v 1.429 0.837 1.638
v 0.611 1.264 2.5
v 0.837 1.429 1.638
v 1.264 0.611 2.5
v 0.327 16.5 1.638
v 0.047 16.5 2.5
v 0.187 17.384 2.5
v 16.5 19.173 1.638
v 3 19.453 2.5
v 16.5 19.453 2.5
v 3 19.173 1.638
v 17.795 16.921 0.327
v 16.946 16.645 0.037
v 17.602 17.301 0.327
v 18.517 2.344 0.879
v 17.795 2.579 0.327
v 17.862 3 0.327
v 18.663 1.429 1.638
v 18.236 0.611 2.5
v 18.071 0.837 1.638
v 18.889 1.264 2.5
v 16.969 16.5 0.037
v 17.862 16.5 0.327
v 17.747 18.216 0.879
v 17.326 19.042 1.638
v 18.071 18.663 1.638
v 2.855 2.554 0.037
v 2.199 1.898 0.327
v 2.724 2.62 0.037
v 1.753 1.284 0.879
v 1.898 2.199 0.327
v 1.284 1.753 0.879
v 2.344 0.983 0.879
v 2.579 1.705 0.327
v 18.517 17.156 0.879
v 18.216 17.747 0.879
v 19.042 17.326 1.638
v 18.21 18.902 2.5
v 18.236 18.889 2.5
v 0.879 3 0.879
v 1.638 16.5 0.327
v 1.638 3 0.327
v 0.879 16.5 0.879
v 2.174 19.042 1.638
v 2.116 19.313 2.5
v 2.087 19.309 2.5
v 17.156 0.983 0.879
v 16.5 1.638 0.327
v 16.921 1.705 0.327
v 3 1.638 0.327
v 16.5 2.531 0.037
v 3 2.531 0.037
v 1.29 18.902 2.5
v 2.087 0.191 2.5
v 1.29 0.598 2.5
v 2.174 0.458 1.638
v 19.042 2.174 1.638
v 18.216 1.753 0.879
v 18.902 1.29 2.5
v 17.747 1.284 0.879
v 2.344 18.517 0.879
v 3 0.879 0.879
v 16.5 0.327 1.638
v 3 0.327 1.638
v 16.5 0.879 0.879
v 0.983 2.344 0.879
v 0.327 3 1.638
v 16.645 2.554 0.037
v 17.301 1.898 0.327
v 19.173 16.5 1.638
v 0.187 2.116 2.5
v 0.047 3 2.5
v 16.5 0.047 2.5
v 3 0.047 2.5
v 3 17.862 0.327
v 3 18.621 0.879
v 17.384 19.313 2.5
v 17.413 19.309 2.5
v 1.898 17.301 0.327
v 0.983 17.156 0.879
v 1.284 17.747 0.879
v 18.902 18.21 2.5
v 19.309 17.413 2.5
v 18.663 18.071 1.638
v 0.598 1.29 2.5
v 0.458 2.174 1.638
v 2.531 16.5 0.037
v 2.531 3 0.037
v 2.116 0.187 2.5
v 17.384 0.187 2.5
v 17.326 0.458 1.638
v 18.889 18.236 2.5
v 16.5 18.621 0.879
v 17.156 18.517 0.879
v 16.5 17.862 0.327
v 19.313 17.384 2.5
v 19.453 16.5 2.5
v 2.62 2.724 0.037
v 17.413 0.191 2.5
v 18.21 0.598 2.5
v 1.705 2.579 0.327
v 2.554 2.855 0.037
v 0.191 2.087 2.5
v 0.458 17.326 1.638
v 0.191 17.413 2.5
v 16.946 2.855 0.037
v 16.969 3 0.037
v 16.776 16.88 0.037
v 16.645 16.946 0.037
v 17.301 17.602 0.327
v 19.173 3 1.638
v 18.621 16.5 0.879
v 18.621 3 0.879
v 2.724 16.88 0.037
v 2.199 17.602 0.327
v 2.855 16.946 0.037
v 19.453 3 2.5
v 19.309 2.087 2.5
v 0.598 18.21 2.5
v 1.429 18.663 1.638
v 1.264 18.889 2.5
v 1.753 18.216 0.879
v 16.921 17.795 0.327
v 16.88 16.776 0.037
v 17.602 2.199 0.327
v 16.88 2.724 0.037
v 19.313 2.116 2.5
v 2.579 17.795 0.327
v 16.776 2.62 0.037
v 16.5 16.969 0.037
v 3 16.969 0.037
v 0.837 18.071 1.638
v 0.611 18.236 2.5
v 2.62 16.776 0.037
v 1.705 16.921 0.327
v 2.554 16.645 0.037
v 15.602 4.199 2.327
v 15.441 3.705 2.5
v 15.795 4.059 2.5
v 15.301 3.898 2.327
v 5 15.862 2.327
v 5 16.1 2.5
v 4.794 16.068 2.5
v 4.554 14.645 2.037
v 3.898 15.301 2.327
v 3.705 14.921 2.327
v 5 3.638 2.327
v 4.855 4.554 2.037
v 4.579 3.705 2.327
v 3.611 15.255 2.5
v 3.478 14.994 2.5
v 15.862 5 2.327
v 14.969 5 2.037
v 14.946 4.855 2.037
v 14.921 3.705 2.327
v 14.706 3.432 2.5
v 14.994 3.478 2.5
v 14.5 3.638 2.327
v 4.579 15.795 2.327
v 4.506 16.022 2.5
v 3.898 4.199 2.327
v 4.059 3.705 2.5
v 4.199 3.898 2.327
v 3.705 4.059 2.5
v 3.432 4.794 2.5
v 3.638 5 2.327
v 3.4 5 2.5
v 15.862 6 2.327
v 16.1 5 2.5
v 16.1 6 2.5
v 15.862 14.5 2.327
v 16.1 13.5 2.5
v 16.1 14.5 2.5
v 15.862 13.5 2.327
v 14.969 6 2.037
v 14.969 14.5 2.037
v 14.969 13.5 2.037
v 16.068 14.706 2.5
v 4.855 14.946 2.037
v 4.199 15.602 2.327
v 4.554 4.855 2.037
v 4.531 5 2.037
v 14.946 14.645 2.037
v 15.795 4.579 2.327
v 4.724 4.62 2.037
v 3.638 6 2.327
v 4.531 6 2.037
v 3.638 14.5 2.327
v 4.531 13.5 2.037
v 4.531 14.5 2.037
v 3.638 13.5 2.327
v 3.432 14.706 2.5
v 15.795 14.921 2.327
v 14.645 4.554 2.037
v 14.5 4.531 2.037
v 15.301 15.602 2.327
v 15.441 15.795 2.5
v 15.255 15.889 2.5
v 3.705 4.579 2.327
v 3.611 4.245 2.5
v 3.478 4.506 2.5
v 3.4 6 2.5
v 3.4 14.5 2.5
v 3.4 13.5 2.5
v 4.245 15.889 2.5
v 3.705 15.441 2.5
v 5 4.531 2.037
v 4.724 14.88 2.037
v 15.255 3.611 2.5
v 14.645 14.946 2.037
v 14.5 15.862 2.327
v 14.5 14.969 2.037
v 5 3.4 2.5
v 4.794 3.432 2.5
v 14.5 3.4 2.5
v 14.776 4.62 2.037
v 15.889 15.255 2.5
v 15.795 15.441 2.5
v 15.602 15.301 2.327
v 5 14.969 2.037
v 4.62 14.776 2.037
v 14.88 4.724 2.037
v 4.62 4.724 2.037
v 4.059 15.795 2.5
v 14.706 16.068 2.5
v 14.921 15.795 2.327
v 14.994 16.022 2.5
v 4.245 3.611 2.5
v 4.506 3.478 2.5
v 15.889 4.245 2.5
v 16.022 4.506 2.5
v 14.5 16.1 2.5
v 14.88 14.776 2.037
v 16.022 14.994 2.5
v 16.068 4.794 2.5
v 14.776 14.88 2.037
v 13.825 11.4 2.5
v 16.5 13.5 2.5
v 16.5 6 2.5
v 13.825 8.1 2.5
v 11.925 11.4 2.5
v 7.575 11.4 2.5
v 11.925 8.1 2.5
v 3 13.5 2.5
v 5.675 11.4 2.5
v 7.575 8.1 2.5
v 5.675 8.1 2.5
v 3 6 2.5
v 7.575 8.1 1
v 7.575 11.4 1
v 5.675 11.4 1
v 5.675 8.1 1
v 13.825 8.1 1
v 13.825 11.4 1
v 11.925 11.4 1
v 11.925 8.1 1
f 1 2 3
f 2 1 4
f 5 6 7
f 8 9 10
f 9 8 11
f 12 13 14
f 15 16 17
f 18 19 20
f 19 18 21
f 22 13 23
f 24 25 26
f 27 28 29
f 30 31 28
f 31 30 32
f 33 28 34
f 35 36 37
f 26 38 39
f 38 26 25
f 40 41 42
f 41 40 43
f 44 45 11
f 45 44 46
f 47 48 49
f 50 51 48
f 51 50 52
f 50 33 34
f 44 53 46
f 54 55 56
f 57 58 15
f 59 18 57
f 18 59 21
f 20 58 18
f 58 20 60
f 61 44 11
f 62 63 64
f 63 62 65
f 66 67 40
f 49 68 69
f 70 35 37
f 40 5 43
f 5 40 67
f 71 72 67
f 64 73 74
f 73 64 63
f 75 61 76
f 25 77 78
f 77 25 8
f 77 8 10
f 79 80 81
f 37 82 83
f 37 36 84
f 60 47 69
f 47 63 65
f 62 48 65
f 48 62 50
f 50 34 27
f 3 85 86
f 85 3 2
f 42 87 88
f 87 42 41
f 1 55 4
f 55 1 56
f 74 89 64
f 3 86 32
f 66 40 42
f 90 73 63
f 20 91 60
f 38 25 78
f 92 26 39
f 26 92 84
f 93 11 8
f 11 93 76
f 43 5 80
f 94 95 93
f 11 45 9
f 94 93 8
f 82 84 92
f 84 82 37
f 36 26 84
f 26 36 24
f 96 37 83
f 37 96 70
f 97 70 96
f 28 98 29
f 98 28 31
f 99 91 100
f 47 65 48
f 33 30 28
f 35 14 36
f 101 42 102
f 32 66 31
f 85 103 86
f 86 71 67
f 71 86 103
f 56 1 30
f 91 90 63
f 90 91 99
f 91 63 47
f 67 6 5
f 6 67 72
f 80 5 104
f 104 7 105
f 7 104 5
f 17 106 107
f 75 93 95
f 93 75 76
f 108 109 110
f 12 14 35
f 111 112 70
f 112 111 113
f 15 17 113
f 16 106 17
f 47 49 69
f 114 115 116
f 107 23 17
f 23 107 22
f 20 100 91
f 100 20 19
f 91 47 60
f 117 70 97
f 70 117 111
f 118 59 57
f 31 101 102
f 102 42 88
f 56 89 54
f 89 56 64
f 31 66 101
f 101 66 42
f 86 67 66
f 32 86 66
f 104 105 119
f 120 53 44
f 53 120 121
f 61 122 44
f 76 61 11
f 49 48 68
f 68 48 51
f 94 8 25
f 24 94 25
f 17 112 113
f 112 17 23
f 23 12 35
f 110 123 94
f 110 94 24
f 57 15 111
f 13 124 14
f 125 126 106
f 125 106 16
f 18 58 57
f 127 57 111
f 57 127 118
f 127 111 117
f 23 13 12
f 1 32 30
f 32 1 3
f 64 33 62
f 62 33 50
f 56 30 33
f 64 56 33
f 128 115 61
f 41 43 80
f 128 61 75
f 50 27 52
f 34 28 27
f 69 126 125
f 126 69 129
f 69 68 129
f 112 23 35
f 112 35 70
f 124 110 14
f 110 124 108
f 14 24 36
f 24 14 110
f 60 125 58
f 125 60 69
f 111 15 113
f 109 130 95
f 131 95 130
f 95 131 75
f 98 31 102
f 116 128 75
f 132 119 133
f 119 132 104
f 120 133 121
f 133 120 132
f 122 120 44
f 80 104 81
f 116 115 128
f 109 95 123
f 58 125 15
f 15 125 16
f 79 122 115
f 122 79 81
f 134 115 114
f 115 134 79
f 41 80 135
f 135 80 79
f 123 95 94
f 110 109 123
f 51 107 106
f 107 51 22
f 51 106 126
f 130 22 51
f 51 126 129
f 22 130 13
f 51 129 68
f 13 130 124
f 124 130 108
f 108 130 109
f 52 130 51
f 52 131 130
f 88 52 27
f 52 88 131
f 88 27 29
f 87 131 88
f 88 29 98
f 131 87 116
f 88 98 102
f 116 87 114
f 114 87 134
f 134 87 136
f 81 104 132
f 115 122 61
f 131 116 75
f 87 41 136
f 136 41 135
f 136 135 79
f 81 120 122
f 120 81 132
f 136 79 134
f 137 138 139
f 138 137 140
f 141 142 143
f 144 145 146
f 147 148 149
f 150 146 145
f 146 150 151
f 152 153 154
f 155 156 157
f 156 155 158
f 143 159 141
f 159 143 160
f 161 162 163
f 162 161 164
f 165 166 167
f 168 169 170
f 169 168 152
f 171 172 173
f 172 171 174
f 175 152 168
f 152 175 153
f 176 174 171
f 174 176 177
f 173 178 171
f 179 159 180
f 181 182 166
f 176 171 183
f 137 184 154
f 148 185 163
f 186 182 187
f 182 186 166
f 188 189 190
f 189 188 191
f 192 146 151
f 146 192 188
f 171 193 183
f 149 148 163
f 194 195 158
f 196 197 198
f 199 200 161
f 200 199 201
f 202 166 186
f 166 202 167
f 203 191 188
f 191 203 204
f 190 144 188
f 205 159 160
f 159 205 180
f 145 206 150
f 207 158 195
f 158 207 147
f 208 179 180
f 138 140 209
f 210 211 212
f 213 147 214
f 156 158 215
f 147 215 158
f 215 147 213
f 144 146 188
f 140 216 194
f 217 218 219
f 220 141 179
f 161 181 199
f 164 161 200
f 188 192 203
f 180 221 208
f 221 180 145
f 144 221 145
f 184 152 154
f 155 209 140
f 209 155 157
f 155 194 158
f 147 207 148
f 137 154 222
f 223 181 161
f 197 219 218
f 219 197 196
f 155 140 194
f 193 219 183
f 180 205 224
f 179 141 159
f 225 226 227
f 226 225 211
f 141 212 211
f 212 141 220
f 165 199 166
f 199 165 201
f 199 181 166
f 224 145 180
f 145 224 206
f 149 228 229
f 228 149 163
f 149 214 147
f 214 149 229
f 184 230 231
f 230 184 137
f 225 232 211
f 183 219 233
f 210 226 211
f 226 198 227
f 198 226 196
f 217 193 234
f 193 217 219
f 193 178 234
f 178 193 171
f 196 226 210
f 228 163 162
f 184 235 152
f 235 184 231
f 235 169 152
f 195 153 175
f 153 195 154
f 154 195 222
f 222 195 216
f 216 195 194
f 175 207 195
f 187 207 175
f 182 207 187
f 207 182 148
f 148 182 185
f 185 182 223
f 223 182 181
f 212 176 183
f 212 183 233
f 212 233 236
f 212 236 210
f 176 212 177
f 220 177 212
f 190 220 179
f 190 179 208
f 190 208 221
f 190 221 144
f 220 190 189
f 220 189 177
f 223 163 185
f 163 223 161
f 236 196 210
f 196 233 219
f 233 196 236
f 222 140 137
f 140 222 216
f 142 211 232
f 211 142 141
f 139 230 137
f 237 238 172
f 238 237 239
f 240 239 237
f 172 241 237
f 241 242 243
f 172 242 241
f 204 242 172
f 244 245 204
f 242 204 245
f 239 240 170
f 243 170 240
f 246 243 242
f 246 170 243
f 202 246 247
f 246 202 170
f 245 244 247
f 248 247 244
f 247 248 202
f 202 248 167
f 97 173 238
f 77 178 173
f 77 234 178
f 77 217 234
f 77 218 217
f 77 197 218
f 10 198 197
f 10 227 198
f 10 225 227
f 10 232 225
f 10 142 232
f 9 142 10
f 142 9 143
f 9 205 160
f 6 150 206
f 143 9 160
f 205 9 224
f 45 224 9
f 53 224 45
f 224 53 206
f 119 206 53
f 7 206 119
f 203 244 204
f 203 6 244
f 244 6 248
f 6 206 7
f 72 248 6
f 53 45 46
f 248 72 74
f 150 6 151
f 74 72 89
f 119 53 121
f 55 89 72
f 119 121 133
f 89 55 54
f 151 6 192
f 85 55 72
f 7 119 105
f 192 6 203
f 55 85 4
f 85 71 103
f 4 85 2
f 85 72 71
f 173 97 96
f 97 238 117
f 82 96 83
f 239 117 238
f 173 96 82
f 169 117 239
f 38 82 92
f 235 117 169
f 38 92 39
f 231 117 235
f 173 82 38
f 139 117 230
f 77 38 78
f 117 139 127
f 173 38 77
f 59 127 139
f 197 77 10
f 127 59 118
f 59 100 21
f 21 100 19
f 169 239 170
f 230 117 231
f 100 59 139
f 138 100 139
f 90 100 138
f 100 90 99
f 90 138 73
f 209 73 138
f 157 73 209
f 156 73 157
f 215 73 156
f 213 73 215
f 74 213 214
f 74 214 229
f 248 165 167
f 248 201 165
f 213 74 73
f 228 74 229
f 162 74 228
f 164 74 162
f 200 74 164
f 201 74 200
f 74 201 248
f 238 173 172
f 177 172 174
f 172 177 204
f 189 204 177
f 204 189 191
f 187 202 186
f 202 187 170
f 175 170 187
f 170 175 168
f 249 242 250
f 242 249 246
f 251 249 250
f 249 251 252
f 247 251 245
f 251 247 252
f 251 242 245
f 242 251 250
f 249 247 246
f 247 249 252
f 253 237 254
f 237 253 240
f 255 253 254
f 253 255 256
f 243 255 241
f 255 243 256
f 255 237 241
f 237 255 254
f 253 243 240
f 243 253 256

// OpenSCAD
//Constants
KEY_1U_MODIFIER = 1;
KEY_1_25U_MODIFIER = 1.25;

//Variables
_switchLength = 15;
_switchWidth = 15;

_switchPaddingLength = 2.25;
_switchPaddingWidth = 2.25;

_kailhKeyCapDepth = 2.5;

_key1uLength = (_switchLength*KEY_1U_MODIFIER)+(_switchPaddingLength*2);
_key1uWidth = (_switchWidth*KEY_1U_MODIFIER)+(_switchPaddingWidth*2);
_key1_25uLength = (_switchLength*KEY_1U_MODIFIER)+(_switchPaddingLength*2);
_key1_25uWidth = (_switchWidth*KEY_1_25U_MODIFIER)+(_switchPaddingWidth*2);

_keyCapSpacingOffset = 0.5;
_keyCapWallThickness = 2;
_keyCapRoundingRadius = 3;

_keyCap1uLength = _key1uLength - _keyCapSpacingOffset;
_keyCap1uWidth = _key1uWidth - _keyCapSpacingOffset;
_keyCap1_25uLength = _key1_25uLength - _keyCapSpacingOffset;
_keyCap1_25uWidth = _key1_25uWidth - _keyCapSpacingOffset;

_capInterfaceShankCenterToCenter = 6.25;


/// MAIN START ///

kailhKeyCapTop(_key1uLength, _key1uWidth, _kailhKeyCapDepth);
//kailhKeyCapTop(_key1_25uWidth, _key1uWidth, _kailhKeyCapDepth);
//kailhKeycapShank();

/// MAIN END ///


//Bodies
module kailhKeyCapTop(length, width, depth)
{
    shankInterfaceWidth = 3.3;
    shankInterfaceCutoutDepth = 1.5;
    shankInterfaceLength = 1.9;
    totalCapInterfaceLength = _capInterfaceShankCenterToCenter+shankInterfaceLength;

    difference()
    {
        union()
        {
            difference()
            {
                baseCapDepth = 20;
                // Form the base cap
                difference()
                {
                    roundedCube(size=[length, width, baseCapDepth], radius = _keyCapRoundingRadius, apply_to="zmin");
                    cutoutCubeSize = [length-(_keyCapWallThickness*2), width-(_keyCapWallThickness*2), baseCapDepth];
                    translate([_keyCapWallThickness, _keyCapWallThickness, _keyCapWallThickness])
                        roundedCube(size=cutoutCubeSize, radius = _keyCapRoundingRadius, apply_to="zmin");
                }
                // Cut to the desired depth
                translate([-1,-1,depth])
                    cube([length+2,width+2, baseCapDepth]);
            }

            // Bar to thicken shank interface area
            thickeningBarLengthPadding = 3;
            thickeningBarWidthPadding = 6;
            thickeningBarLength = length-thickeningBarLengthPadding*2;
            thickeningBarWidth = width-thickeningBarWidthPadding*2;
            roundedCubeDepthAdjustment = 0.1;
            translate([(length-thickeningBarLength)/2, (width-thickeningBarWidth)/2, roundedCubeDepthAdjustment])
                cube([thickeningBarLength, thickeningBarWidth, depth-roundedCubeDepthAdjustment]);
        }

        // Cut out the interface for the shank
        translate([(length-totalCapInterfaceLength)/2,(width-shankInterfaceWidth)/2, depth-shankInterfaceCutoutDepth])
            union()
            {
                cube([shankInterfaceLength,shankInterfaceWidth,shankInterfaceCutoutDepth+1]);
                translate([_capInterfaceShankCenterToCenter,0,0])
                    cube([shankInterfaceLength,shankInterfaceWidth,shankInterfaceCutoutDepth+1]);
            }
    }
}

module kailhKeycapShank()
{
    // Note: This is setting that might have to be tweaked depending
    // on the printer's resolution. Lower the number for tighter gaps.
    printingGapTolerance = 0.05;

    switchInterfaceShankLength = 4.25;
    switchInterfaceShankWidth = 1.20 - printingGapTolerance;
    switchInterfaceShankDepth = 3 - printingGapTolerance;
    switchInterfaceShankCenterToCenter = 5.70;
    capInterfaceShankLength = 1.5;
    capInterfaceShankWidth = 1.5-printingGapTolerance;
    capInterfaceShankDepth = switchInterfaceShankDepth-printingGapTolerance;
    shankInterfaceConnectorLength = 1.25;
    shankInterfaceConnectorWidth = 12;
    shankInterfaceConnectorDepth = switchInterfaceShankDepth;

    union()
    {
        //Cap interface
        translate([0,0,0])
            cube([capInterfaceShankLength, capInterfaceShankWidth, capInterfaceShankDepth]);
        translate([0,_capInterfaceShankCenterToCenter,0])
            cube([capInterfaceShankLength, capInterfaceShankWidth, capInterfaceShankDepth]);

        //Interface connector
        shankInterfaceCenteringWidth = ((_capInterfaceShankCenterToCenter+capInterfaceShankWidth)-shankInterfaceConnectorWidth)/2;
        translate([capInterfaceShankLength,shankInterfaceCenteringWidth,0])
            cube([shankInterfaceConnectorLength, shankInterfaceConnectorWidth, shankInterfaceConnectorDepth]);

        //Switch interface
        centeringWidth = ((shankInterfaceConnectorWidth-(switchInterfaceShankCenterToCenter+switchInterfaceShankWidth))/2)+shankInterfaceCenteringWidth;
        translate([0,centeringWidth,0])
        {
            translate([capInterfaceShankLength+shankInterfaceConnectorLength,0,0])
                cube([switchInterfaceShankLength, switchInterfaceShankWidth, switchInterfaceShankDepth]);
            translate([capInterfaceShankLength+shankInterfaceConnectorLength, switchInterfaceShankCenterToCenter,0])
                cube([switchInterfaceShankLength, switchInterfaceShankWidth, switchInterfaceShankDepth]);
        }
    }
}

//Utility
/// Builds a cube with rounded corners
/// size - dimension vector
/// center - centered on xyz planes?
/// radius - rounding radius
/// apply_to - which sides to round
module roundedCube(size = [1, 1, 1], center = false, radius = 0.5, apply_to = "all")
{
    // If single value, convert to [x, y, z] vector
    size = (size[0] == undef) ? [size, size, size] : size;

    translate_min = radius;
    translate_xmax = size[0] - radius;
    translate_ymax = size[1] - radius;
    translate_zmax = size[2] - radius;

    diameter = radius * 2;

    obj_translate = (center == false) ?
        [0, 0, 0] : [
            -(size[0] / 2),
            -(size[1] / 2),
            -(size[2] / 2)
        ];

    translate(v = obj_translate) {
        hull() {
            for (translate_x = [translate_min, translate_xmax]) {
                x_at = (translate_x == translate_min) ? "min" : "max";
                for (translate_y = [translate_min, translate_ymax]) {
                    y_at = (translate_y == translate_min) ? "min" : "max";
                    for (translate_z = [translate_min, translate_zmax]) {
                        z_at = (translate_z == translate_min) ? "min" : "max";

                        translate(v = [translate_x, translate_y, translate_z])
                        if (
                            (apply_to == "all") ||
                            (apply_to == "xmin" && x_at == "min") || (apply_to == "xmax" && x_at == "max") ||
                            (apply_to == "ymin" && y_at == "min") || (apply_to == "ymax" && y_at == "max") ||
                            (apply_to == "zmin" && z_at == "min") || (apply_to == "zmax" && z_at == "max")
                        ) {
                            sphere(r = radius, $fn=20);
                        } else {
                            rotate =
                                (apply_to == "xmin" || apply_to == "xmax" || apply_to == "x") ? [0, 90, 0] : (
                                (apply_to == "ymin" || apply_to == "ymax" || apply_to == "y") ? [90, 90, 0] :
                                [0, 0, 0]
                            );
                            rotate(a = rotate)
                            cylinder(h = diameter, r = radius, center = true, $fn=20);
                        }
                    }
                }
            }
        }
    }
}
